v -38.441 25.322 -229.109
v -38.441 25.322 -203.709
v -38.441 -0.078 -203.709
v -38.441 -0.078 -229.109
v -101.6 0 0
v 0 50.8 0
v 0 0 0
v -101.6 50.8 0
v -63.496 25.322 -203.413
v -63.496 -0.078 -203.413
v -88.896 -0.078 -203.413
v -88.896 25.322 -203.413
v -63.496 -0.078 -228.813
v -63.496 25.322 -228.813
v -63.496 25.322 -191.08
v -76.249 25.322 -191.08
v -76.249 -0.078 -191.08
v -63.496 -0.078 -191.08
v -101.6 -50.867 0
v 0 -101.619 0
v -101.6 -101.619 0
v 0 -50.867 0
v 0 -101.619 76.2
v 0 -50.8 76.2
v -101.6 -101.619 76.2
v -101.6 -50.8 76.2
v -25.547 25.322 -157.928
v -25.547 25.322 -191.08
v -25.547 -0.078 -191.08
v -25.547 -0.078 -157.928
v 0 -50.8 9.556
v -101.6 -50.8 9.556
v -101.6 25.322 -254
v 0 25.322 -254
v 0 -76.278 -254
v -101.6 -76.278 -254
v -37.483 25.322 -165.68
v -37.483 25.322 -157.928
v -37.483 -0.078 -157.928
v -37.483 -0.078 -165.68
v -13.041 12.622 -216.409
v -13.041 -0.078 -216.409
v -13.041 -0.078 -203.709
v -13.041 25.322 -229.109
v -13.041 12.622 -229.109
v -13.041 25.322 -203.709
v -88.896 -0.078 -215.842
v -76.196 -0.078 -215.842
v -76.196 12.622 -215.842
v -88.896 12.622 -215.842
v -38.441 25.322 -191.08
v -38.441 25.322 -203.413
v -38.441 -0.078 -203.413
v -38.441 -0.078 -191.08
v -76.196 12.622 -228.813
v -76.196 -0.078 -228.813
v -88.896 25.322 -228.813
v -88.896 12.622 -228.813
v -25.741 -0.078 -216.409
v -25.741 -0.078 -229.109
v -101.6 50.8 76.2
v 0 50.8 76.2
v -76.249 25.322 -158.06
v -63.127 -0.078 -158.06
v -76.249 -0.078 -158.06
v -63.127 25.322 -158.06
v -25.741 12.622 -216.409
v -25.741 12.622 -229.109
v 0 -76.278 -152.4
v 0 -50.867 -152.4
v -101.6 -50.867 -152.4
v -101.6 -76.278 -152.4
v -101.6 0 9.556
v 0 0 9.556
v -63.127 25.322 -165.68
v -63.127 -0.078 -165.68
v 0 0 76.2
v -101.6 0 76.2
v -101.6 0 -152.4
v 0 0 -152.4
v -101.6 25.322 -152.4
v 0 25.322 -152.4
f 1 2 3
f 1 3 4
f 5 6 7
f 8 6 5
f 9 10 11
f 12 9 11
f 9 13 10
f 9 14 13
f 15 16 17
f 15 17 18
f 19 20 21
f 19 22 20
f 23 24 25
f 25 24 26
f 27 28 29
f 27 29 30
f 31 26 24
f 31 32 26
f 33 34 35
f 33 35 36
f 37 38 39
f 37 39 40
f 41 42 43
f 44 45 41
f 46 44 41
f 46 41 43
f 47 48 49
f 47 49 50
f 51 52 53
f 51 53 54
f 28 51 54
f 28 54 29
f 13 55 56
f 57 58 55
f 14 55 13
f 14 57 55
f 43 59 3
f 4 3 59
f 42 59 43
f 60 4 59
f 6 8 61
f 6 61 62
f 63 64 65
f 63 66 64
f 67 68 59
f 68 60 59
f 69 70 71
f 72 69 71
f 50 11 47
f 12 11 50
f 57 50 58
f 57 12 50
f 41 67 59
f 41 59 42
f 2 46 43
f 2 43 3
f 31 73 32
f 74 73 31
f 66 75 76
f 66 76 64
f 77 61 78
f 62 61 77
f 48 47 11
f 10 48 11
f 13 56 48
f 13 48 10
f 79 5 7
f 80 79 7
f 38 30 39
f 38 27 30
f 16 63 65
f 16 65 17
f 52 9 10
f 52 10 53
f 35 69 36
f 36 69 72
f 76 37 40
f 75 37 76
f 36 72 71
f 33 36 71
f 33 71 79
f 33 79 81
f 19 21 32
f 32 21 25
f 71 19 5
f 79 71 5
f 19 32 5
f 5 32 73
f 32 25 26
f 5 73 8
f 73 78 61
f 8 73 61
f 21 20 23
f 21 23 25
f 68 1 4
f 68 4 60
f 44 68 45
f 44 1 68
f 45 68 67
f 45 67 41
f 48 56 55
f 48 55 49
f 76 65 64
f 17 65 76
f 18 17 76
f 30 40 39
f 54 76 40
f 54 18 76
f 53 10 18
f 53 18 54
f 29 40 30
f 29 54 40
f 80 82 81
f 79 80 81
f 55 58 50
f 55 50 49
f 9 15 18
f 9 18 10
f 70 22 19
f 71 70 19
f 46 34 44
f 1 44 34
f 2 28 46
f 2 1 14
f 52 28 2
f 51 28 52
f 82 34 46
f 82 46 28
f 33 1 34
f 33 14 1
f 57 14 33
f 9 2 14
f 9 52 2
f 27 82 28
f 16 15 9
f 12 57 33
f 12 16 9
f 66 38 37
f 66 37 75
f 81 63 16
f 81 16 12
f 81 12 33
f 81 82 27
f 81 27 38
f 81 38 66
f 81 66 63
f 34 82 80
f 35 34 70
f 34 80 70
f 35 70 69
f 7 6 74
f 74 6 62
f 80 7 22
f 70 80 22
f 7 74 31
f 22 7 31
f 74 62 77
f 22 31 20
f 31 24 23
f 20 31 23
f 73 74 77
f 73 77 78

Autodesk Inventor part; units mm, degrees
ref_plane "YZ Plane" through (0, 0, 0) normal (1, 0, 0) x (0, 1, 0)
ref_plane "XZ Plane" through (0, 0, 0) normal (0, 1, 0) x (-1, 0, 0)
ref_plane "XY Plane" through (0, 0, 0) normal (0, 0, 1) x (1, 0, 0)
sketch "Sketch1" plane through (0, 0, 0) normal (0, 0, 1) x (1, 0, 0)
  line L0 (-101.6, 50.8) -> (0, 50.8)
  line L1 (0, 50.8) -> (0, 0)
  line L2 (0, 0) -> (-101.6, 0)
  line L3 (-101.6, 0) -> (-101.6, 50.8)
  dimension "d0" = 101.6
  dimension "d1" = 50.8
extrude "Extrusion1" add sketch "Sketch1" along normal blind 76.2
sketch "Sketch2" plane through (-101.6, 0, 0) normal (0, -1, 0) x (1, 0, 0)
  line L0 (0, 0) -> (0, 76.2) projected
  line L1 (101.6, 0) -> (0, 0)
  line L2 (0, 0) -> (0, 9.5563)
  line L3 (0, 9.5563) -> (101.6, 9.5563)
  line L4 (101.6, 9.5563) -> (101.6, 0)
extrude "Extrusion2" add sketch "Sketch2" along normal blind 50.8
sketch "Sketch3" plane through (0, 0, 0) normal (0, 0, -1) x (-1, 0, 0)
  line L0 (101.6, -50.8) -> (0, -50.8)
  line L1 (0, -50.8) -> (0, -101.6194)
  line L2 (0, -101.6194) -> (101.6, -101.6194)
  line L3 (101.6, -101.6194) -> (101.6, -50.8)
  point P0 (0, 0)
extrude "Extrusion3" add sketch "Sketch3" against normal blind 76.2
sketch "Sketch4" plane through (0, 0, 0) normal (0, 0, -1) x (-1, 0, 0)
  line L0 (0, -101.6194) -> (0, 50.8) projected
  line L1 (101.6, 50.8) -> (101.6, -101.6194) projected
  line L2 (101.6, 0) -> (0, 0)
  line L3 (0, 0) -> (0, -50.8671)
  line L4 (0, -50.8671) -> (101.6, -50.8671)
  line L5 (101.6, -50.8671) -> (101.6, 0)
  point P0 (0, 0)
extrude "Extrusion4" add sketch "Sketch4" along normal blind 152.4
sketch "Sketch5" plane through (0, 0, -152.4) normal (0, 0, -1) x (-1, 0, 0)
  line L0 (0, -76.278) -> (101.6, -76.278)
  line L1 (101.6, -76.278) -> (101.6, 25.322)
  line L2 (101.6, 25.322) -> (0, 25.322)
  line L3 (0, 25.322) -> (0, -76.278)
  dimension "d10" = 101.6
  dimension "d11" = 101.6
extrude "Extrusion5" add sketch "Sketch5" along normal blind 101.6
sketch "Sketch6" plane through (-101.6, 25.322, -152.4) normal (0, 1, 0) x (1, 0, 0)
  line L0 (0, 0) -> (101.6, 0) projected
  line L1 (12.7038, 76.4129) -> (38.1038, 76.4129)
  line L2 (38.1038, 76.4129) -> (38.1038, 51.0129)
  line L3 (38.1038, 51.0129) -> (12.7038, 51.0129)
  line L4 (12.7038, 51.0129) -> (12.7038, 76.4129)
  line L5 (63.1592, 76.7092) -> (88.5592, 76.7092)
  line L6 (88.5592, 76.7092) -> (88.5592, 51.3092)
  line L7 (88.5592, 51.3092) -> (63.1592, 51.3092)
  line L8 (63.1592, 51.3092) -> (63.1592, 76.7092)
  line L9 (37.1295, 0) -> (29.2048, 0)
  point P0 (101.6, -152.4)
  dimension "d14" = 25.4
  dimension "d15" = 25.4
  dimension "d16" = 25.4
  dimension "d17" = 25.4
extrude "Extrusion6" cut sketch "Sketch6" against normal blind 25.4
sketch "Sketch7" plane through (-101.6, 25.322, -152.4) normal (0, 1, 0) x (1, 0, 0)
  line L0 (25.3513, 38.6799) -> (38.4727, 38.6799)
  line L1 (38.4727, 38.6799) -> (38.4727, 0.5799)
  line L2 (38.4727, 0.5799) -> (25.3513, 0.5799)
  line L3 (25.3513, 0.5799) -> (25.3513, 38.6799)
  line L4 (64.117, 38.5479) -> (76.0531, 38.5479)
  line L5 (76.0531, 38.5479) -> (76.0531, 0.4479)
  line L6 (76.0531, 0.4479) -> (64.117, 0.4479)
  line L7 (64.117, 0.4479) -> (64.117, 38.5479)
  point P0 (101.6, -152.4)
  dimension "d20" = 38.1
  dimension "d21" = 38.1
extrude "Extrusion7" cut sketch "Sketch7" against normal blind 25.4
sketch "Sketch8" plane through (-101.6, 25.322, -152.4) normal (0, 1, 0) x (1, 0, 0)
  line L0 (76.0531, 38.5479) -> (76.0531, 0.4479) projected
  line L1 (25.3513, 38.6799) -> (76.0531, 38.6799)
  line L2 (76.0531, 38.6799) -> (76.0531, 13.2799)
  line L3 (76.0531, 13.2799) -> (25.3513, 13.2799)
  line L4 (25.3513, 13.2799) -> (25.3513, 38.6799)
  point P0 (101.6, -152.4)
  dimension "d24" = 25.4
extrude "Extrusion8" cut sketch "Sketch8" against normal blind 25.4
sketch "Sketch9" plane through (-76.2487, 25.322, -152.9799) normal (1, 0, 0) x (0, 0, -1)
  line L0 (0, 0) -> (38.1, 0) projected
  line L1 (0, 0) -> (0, -25.4) projected
  line L2 (38.1, -25.4) -> (0, -25.4) projected
  line L3 (38.1, 0) -> (38.1, -25.4) projected
  point P0 (-152.9799, -25.322)
sketch "Sketch10" plane through (-101.6, 25.322, -152.4) normal (0, 1, 0) x (1, 0, 0)
  line L0 (25.3513, 38.6799) -> (76.0531, 38.6799) projected
  line L1 (38.1038, 51.0129) -> (63.1592, 51.0129)
  line L2 (63.1592, 51.0129) -> (63.1592, 38.6799)
  line L3 (63.1592, 38.6799) -> (38.1038, 38.6799)
  line L4 (38.1038, 38.6799) -> (38.1038, 51.0129)
  point P0 (101.6, -152.4)
extrude "Extrusion9" cut sketch "Sketch10" against normal blind 25.4
sketch "Sketch11" plane through (-101.6, -0.078, -152.4) normal (0, 1, 0) x (1, 0, 0)
  line L0 (88.5592, 76.7092) -> (75.8592, 76.7092)
  line L1 (75.8592, 76.7092) -> (75.8592, 64.0092)
  line L2 (75.8592, 64.0092) -> (88.5592, 64.0092)
  line L3 (88.5592, 64.0092) -> (88.5592, 76.7092)
  point P0 (101.6, -152.4)
extrude "Extrusion10" add sketch "Sketch11" along normal blind 12.7
sketch "Sketch12" plane through (-101.6, -0.078, -152.4) normal (0, 1, 0) x (1, 0, 0)
  line L0 (12.7038, 76.4129) -> (25.4038, 76.4129)
  line L1 (25.4038, 76.4129) -> (25.4038, 63.4415)
  line L2 (25.4038, 63.4415) -> (12.7038, 63.4415)
  line L3 (12.7038, 63.4415) -> (12.7038, 76.4129)
  point P0 (101.6, -152.4)
extrude "Extrusion11" add sketch "Sketch12" along normal blind 12.7
sketch "Sketch13" plane through (-63.1273, 25.322, -152.9799) normal (0, 0, -1) x (-1, 0, 0)
  line L0 (13.1215, -25.4) -> (0, -25.4) projected
  line L1 (13.1215, 0) -> (13.1215, -25.4) projected
  line L2 (0, 0) -> (13.1215, 0) projected
  line L3 (0, 0) -> (0, -25.4) projected
  point P0 (-63.1273, -25.322)
extrude "Extrusion12" add sketch "Sketch13" along normal blind 5.08
sketch "Sketch14" plane through (-25.5469, 25.322, -152.8479) normal (0, 0, -1) x (-1, 0, 0)
  line L0 (11.9361, -25.4) -> (0, -25.4) projected
  line L1 (11.9361, 0) -> (11.9361, -25.4) projected
  line L2 (0, 0) -> (11.9361, 0) projected
  line L3 (0, 0) -> (0, -25.4) projected
  point P0 (-25.5469, -25.322)
extrude "Extrusion13" add sketch "Sketch14" along normal blind 5.08
properties part number "Creeper"
